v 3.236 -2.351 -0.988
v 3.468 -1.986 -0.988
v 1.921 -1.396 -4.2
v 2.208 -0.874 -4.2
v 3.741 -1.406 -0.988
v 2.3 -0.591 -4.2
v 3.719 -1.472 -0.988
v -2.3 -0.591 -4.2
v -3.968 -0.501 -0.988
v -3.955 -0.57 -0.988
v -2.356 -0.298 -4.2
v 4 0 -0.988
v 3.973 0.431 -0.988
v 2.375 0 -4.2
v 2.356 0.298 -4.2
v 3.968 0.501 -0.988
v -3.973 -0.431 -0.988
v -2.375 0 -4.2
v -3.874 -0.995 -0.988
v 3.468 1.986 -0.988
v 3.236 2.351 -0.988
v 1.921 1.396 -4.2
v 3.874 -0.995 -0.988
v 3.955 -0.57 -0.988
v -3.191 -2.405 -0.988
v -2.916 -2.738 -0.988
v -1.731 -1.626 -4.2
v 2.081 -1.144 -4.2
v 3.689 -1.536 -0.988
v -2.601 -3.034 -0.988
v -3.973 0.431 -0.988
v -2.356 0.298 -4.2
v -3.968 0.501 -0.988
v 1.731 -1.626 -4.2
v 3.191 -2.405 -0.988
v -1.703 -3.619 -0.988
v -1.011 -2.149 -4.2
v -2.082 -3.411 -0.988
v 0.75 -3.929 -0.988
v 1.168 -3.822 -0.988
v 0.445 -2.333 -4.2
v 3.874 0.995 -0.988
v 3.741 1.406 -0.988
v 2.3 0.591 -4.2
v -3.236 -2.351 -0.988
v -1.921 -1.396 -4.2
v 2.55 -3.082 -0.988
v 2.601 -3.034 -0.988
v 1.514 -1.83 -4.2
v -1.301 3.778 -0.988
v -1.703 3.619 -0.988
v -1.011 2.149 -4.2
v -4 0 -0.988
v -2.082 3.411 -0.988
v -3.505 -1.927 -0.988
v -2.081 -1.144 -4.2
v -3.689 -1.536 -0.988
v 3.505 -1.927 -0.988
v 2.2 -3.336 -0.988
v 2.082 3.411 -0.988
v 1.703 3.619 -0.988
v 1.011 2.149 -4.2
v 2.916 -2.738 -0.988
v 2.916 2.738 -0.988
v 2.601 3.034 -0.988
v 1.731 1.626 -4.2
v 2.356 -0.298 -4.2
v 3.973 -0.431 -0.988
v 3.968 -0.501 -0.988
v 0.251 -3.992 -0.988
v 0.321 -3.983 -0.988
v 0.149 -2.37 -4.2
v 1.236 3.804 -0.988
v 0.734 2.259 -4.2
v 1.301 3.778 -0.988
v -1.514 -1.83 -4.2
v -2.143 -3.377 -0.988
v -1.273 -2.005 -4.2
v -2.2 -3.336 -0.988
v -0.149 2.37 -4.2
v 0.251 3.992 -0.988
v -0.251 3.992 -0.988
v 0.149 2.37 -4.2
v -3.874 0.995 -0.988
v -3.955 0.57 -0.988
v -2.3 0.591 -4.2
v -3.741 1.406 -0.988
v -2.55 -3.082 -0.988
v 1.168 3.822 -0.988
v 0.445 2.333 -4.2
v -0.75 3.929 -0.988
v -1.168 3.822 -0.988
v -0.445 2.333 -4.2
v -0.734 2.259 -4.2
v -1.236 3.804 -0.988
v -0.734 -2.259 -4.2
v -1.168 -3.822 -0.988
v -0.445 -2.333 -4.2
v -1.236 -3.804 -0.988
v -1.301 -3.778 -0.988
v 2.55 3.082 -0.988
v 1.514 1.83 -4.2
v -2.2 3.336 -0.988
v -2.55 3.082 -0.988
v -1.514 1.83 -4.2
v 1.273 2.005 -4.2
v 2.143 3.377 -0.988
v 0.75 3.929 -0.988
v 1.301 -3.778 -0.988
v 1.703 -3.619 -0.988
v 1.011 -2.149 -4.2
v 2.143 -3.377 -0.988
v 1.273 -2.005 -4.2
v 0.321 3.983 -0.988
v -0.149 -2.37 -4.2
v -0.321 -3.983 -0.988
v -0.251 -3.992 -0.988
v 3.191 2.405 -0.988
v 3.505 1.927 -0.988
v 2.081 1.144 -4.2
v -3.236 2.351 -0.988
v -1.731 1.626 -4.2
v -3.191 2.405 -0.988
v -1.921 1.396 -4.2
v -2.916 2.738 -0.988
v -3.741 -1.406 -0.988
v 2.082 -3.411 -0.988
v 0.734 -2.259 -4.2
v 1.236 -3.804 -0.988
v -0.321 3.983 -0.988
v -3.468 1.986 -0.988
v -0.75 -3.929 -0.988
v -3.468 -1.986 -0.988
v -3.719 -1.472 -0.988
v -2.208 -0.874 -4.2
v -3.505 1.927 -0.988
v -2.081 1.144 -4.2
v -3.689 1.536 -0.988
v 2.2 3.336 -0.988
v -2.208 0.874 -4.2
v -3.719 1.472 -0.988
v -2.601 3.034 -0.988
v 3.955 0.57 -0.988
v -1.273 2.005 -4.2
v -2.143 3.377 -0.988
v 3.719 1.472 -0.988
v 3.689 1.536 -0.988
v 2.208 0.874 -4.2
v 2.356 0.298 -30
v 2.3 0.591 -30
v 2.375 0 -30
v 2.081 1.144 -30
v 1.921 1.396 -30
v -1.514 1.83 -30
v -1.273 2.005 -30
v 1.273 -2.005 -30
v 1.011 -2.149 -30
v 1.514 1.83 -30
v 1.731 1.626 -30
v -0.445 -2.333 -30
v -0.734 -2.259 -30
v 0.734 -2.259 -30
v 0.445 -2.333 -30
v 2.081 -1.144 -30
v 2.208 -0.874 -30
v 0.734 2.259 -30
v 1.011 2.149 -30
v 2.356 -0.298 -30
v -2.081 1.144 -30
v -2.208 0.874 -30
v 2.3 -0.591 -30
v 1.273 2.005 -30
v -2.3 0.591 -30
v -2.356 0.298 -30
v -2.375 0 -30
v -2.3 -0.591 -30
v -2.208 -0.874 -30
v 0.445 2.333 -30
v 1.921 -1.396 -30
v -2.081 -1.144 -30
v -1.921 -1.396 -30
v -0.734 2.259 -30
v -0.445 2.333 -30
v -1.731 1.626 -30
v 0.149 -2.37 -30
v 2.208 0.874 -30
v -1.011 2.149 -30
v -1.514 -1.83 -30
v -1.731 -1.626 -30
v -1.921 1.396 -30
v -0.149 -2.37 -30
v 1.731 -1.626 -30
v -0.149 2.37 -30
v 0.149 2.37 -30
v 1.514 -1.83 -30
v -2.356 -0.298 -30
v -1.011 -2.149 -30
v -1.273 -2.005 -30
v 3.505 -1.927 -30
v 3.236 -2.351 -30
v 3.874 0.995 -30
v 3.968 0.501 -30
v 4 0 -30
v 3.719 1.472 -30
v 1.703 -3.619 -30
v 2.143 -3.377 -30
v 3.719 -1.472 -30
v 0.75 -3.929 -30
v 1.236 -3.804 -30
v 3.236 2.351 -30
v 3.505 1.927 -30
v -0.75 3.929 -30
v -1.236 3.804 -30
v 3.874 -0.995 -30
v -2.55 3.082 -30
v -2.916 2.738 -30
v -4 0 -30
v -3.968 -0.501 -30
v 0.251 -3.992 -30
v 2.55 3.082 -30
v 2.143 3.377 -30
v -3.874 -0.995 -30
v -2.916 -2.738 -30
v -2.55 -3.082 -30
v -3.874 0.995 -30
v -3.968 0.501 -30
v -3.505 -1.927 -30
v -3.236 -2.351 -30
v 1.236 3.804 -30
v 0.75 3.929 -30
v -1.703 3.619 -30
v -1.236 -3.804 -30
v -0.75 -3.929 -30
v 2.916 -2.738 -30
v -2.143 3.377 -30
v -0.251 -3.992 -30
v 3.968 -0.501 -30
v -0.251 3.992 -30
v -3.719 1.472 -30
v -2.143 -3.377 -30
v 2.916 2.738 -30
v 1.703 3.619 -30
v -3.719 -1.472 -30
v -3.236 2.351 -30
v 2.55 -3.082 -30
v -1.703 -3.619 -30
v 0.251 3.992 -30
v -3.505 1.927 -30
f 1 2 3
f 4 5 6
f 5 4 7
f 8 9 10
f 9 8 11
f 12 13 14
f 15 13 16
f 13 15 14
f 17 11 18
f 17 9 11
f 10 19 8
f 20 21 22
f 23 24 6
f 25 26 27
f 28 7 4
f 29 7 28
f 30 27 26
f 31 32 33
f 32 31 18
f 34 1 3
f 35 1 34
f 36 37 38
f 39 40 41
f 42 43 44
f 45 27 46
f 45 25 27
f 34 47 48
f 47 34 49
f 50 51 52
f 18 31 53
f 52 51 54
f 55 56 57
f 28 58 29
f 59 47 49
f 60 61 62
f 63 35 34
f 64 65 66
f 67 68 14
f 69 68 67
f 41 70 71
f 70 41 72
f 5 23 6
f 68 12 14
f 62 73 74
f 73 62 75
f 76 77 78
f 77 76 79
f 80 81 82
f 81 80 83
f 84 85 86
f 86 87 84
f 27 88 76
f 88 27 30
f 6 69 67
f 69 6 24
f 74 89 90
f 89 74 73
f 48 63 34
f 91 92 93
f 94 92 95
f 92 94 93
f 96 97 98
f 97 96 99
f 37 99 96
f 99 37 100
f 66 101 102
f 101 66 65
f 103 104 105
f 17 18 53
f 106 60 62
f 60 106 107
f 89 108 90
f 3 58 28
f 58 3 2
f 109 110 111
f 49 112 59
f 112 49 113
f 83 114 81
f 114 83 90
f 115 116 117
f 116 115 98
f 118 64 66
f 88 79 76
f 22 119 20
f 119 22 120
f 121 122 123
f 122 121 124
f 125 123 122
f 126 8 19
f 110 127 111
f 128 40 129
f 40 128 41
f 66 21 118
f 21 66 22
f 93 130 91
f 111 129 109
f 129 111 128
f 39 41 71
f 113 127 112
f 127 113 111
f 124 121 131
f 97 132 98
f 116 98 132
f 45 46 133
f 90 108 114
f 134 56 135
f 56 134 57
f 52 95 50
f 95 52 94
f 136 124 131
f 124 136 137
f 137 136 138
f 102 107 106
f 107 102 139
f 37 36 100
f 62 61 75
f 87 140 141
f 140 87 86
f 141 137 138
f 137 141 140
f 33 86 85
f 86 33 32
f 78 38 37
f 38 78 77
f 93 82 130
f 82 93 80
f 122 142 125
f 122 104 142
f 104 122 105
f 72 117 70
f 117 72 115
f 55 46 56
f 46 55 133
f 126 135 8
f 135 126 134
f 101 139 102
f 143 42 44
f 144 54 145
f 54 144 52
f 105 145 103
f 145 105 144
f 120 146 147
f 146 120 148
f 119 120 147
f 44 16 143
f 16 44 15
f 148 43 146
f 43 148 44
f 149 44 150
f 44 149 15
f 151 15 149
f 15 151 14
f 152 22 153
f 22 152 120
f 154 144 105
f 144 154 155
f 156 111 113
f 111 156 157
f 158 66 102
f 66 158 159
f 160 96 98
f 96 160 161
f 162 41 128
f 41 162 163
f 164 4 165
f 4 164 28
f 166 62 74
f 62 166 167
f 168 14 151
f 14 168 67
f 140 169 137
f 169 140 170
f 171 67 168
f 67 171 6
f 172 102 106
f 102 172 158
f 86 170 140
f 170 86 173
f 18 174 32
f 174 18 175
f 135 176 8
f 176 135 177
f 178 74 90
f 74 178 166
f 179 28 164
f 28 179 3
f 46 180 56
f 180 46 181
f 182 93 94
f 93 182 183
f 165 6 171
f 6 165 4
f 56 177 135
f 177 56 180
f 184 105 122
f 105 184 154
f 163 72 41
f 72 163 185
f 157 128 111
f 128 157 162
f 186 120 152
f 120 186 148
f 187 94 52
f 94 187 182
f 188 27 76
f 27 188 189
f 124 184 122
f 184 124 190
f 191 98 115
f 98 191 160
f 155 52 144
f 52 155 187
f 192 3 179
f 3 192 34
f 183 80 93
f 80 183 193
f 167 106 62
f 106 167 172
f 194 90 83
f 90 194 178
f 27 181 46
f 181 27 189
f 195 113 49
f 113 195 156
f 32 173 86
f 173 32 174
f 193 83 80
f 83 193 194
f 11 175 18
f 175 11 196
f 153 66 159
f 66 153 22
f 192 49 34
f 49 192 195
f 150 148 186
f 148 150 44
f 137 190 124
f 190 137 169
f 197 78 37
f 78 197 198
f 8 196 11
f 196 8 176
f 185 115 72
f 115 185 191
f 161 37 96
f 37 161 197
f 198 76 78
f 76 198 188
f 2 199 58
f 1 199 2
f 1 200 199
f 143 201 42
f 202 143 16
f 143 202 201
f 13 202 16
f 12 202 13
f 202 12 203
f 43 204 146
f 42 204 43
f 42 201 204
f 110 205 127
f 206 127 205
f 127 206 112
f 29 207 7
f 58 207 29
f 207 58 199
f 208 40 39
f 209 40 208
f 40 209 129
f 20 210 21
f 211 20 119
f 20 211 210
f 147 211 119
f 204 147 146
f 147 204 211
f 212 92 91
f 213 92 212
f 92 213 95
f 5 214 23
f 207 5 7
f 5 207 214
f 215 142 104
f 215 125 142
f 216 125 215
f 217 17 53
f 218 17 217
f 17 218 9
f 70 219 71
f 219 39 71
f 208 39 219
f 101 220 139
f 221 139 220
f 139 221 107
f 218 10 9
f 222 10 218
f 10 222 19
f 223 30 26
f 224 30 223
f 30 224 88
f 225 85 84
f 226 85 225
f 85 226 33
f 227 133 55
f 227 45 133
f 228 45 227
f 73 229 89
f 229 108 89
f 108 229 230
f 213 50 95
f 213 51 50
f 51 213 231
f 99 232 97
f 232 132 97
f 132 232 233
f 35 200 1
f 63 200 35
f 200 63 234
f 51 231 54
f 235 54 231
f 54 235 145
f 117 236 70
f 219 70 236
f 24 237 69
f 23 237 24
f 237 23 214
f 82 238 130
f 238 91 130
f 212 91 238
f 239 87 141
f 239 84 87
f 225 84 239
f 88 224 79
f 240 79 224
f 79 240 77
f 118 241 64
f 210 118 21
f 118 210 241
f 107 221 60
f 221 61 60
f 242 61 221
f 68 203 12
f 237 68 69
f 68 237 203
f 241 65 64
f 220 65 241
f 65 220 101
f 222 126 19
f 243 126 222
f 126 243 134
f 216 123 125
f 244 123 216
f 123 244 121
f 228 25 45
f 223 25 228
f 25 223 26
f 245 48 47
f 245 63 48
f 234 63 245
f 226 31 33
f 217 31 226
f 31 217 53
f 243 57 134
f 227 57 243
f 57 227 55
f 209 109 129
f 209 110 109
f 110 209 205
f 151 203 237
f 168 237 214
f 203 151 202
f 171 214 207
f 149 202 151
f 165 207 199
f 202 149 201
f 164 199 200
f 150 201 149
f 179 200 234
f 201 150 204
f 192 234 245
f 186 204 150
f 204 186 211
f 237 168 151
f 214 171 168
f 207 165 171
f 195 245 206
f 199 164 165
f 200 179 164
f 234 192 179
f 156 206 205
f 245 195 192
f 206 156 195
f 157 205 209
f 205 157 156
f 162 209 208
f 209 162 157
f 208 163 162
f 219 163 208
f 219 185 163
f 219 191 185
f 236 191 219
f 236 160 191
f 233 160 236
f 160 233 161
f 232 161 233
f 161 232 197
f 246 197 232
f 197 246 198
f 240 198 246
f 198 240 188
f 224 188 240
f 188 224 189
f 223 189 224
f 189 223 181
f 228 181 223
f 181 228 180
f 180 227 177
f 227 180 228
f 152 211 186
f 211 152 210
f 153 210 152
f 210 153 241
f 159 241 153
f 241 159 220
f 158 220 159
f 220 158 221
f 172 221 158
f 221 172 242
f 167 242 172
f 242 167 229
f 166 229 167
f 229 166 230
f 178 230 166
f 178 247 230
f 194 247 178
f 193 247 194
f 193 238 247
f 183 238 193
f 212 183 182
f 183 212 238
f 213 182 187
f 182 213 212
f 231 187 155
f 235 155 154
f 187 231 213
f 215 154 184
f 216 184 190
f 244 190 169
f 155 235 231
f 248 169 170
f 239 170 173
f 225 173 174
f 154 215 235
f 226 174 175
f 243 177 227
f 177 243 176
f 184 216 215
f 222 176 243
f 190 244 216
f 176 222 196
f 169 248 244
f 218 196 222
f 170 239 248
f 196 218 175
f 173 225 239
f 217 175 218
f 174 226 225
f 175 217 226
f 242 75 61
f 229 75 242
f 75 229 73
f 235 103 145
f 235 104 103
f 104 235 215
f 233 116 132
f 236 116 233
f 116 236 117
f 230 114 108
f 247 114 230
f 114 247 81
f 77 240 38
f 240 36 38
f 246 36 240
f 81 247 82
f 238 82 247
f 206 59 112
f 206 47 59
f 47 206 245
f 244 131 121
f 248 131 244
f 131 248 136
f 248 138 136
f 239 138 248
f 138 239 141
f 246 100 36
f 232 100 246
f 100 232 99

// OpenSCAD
$fn = 50;

difference() {
	union() {
		translate(v = [0, 0, -30.0]) {
			cylinder(h = 30, r = 4.0);
		}
	}
	union() {
		translate(v = [0, 0, 0]) {
			rotate(a = [0, 0, 0]) {
				difference() {
					union() {
						translate(v = [0, 0, -33.0]) {
							cylinder(h = 33, r = 2.25);
						}
						translate(v = [0, 0, -4.2]) {
							cylinder(h = 4.2, r1 = 2.375, r2 = 4.5);
						}
						translate(v = [0, 0, -33.0]) {
							cylinder(h = 33, r = 2.375);
						}
						translate(v = [0, 0, -33.0]) {
							cylinder(h = 33, r = 2.25);
						}
					}
					union();
				}
			}
		}
	}
}
